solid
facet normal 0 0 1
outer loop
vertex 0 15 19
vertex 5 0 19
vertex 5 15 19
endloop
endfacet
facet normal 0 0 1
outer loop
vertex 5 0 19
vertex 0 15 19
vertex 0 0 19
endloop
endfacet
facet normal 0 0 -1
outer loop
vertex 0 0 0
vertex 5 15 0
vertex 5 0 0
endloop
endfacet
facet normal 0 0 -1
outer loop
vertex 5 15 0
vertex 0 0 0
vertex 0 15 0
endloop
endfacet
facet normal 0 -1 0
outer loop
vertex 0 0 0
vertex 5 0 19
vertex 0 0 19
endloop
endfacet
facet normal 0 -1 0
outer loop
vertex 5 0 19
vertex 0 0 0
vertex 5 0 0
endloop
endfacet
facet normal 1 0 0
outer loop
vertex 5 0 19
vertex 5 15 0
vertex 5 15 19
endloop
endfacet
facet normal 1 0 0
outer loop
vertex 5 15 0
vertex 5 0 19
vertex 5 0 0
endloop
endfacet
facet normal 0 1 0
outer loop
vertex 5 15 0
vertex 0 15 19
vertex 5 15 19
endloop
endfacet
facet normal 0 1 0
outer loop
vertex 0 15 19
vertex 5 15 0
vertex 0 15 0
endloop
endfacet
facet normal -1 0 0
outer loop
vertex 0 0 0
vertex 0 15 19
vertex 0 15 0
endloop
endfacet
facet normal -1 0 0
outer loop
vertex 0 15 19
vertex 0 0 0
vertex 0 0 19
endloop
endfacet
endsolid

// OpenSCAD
// Generated by SolidPython 1.0.1 on 2020-07-29 00:39:26


cube(size = [5, 15, 19]);
/***********************************************
*********      SolidPython code:      **********
************************************************
 
# import packages: SolidPython
from solid import *
from solid.utils import *
from itertools import chain, combinations


class Resize:

    def __init__(self, scad_file):
        self.scad_file = scad_file
        #self.scad_file = import_scad(scad_file)
        # cone/cylinder param:
        self.r1 = 0
        self.r2 = 0
        self.h = 0
        # rectangular prism param:
        self.w = 0
        self.l = 0
        # ellipse param:
        self.r = 0

    # import OpenScad code (file name corresponds to shape)


    # classify shape + parameters
    def assign(self, param1, param2, param3):
        if self.scad_file == 'cone.scad':
            self.r1 = param1
            self.r2 = param2
            self.h = param3
        elif self.scad_file == 'cylinder.scad':
            self.r1 = param1
            self.r2 = param2
            self.h = param3
        elif self.scad_file == 'rectangularPrism.scad':
            self.h = param1
            self.l = param2
            self.w = param3
        else:
            self.r = param1
            self.h = param2

    # resize parameters
    def iterate(self):
        x = range(3, 20, 2)
        i = 1
        if self.scad_file == 'cone.scad':
            tempList = list(combinations(x, 2))
            for temp in tempList:
                param1 = temp[0]
                param2 = temp[1]
                filepath = 'produced_scad_files/' + 'cone' + str(param1) + '_' + str(param2) + '_' + '.scad'
                scad_render_to_file(cylinder(h=param1, r1=param2, r2=0), filepath)

        elif self.scad_file == 'cylinder.scad':
            tempList = list(combinations(x, 3))
            for temp in tempList:
                param1 = temp[0]
                param2 = temp[1]
                filepath = 'produced_scad_files/' + 'cylinder' + str(param1) + '_' + str(param2) + '_' + '.scad'
                scad_render_to_file(cylinder(h=param1, r1=param2, r2=param2), filepath)

        elif self.scad_file == 'rectangularPrism.scad':
            tempList = list(combinations(x, 3))
            for temp in tempList:
                param1 = temp[0]
                param2 = temp[1]
                param3 = temp[2]
                filepath = 'produced_scad_files/' + 'rectangularPrism' + str(param1) + '_' + str(param2) + '_' + str(
                    param3) + '.scad'
                scad_render_to_file(cube(size=(param1, param2, param3)), filepath)

        elif self.scad_file == 'ellipse.scad':
            tempList = list(combinations(x, 4))
            for temp in tempList:
                param1 = temp[0]
                param2 = temp[1]
                param3 = temp[2]
                param4 = temp[3]
                filepath = 'produced_scad_files/' + 'ellipse' + str(param1) + '_' + str(param2) + '_' + str(param3) + '_' + str(param4) + '.scad'
                scad_render_to_file(scale([param1, param2, param3])(sphere(r=param4)), filepath)

    def render_to_scadfile(self):
        scad_render_to_file(scad, 'example.scad') 
 
************************************************/
